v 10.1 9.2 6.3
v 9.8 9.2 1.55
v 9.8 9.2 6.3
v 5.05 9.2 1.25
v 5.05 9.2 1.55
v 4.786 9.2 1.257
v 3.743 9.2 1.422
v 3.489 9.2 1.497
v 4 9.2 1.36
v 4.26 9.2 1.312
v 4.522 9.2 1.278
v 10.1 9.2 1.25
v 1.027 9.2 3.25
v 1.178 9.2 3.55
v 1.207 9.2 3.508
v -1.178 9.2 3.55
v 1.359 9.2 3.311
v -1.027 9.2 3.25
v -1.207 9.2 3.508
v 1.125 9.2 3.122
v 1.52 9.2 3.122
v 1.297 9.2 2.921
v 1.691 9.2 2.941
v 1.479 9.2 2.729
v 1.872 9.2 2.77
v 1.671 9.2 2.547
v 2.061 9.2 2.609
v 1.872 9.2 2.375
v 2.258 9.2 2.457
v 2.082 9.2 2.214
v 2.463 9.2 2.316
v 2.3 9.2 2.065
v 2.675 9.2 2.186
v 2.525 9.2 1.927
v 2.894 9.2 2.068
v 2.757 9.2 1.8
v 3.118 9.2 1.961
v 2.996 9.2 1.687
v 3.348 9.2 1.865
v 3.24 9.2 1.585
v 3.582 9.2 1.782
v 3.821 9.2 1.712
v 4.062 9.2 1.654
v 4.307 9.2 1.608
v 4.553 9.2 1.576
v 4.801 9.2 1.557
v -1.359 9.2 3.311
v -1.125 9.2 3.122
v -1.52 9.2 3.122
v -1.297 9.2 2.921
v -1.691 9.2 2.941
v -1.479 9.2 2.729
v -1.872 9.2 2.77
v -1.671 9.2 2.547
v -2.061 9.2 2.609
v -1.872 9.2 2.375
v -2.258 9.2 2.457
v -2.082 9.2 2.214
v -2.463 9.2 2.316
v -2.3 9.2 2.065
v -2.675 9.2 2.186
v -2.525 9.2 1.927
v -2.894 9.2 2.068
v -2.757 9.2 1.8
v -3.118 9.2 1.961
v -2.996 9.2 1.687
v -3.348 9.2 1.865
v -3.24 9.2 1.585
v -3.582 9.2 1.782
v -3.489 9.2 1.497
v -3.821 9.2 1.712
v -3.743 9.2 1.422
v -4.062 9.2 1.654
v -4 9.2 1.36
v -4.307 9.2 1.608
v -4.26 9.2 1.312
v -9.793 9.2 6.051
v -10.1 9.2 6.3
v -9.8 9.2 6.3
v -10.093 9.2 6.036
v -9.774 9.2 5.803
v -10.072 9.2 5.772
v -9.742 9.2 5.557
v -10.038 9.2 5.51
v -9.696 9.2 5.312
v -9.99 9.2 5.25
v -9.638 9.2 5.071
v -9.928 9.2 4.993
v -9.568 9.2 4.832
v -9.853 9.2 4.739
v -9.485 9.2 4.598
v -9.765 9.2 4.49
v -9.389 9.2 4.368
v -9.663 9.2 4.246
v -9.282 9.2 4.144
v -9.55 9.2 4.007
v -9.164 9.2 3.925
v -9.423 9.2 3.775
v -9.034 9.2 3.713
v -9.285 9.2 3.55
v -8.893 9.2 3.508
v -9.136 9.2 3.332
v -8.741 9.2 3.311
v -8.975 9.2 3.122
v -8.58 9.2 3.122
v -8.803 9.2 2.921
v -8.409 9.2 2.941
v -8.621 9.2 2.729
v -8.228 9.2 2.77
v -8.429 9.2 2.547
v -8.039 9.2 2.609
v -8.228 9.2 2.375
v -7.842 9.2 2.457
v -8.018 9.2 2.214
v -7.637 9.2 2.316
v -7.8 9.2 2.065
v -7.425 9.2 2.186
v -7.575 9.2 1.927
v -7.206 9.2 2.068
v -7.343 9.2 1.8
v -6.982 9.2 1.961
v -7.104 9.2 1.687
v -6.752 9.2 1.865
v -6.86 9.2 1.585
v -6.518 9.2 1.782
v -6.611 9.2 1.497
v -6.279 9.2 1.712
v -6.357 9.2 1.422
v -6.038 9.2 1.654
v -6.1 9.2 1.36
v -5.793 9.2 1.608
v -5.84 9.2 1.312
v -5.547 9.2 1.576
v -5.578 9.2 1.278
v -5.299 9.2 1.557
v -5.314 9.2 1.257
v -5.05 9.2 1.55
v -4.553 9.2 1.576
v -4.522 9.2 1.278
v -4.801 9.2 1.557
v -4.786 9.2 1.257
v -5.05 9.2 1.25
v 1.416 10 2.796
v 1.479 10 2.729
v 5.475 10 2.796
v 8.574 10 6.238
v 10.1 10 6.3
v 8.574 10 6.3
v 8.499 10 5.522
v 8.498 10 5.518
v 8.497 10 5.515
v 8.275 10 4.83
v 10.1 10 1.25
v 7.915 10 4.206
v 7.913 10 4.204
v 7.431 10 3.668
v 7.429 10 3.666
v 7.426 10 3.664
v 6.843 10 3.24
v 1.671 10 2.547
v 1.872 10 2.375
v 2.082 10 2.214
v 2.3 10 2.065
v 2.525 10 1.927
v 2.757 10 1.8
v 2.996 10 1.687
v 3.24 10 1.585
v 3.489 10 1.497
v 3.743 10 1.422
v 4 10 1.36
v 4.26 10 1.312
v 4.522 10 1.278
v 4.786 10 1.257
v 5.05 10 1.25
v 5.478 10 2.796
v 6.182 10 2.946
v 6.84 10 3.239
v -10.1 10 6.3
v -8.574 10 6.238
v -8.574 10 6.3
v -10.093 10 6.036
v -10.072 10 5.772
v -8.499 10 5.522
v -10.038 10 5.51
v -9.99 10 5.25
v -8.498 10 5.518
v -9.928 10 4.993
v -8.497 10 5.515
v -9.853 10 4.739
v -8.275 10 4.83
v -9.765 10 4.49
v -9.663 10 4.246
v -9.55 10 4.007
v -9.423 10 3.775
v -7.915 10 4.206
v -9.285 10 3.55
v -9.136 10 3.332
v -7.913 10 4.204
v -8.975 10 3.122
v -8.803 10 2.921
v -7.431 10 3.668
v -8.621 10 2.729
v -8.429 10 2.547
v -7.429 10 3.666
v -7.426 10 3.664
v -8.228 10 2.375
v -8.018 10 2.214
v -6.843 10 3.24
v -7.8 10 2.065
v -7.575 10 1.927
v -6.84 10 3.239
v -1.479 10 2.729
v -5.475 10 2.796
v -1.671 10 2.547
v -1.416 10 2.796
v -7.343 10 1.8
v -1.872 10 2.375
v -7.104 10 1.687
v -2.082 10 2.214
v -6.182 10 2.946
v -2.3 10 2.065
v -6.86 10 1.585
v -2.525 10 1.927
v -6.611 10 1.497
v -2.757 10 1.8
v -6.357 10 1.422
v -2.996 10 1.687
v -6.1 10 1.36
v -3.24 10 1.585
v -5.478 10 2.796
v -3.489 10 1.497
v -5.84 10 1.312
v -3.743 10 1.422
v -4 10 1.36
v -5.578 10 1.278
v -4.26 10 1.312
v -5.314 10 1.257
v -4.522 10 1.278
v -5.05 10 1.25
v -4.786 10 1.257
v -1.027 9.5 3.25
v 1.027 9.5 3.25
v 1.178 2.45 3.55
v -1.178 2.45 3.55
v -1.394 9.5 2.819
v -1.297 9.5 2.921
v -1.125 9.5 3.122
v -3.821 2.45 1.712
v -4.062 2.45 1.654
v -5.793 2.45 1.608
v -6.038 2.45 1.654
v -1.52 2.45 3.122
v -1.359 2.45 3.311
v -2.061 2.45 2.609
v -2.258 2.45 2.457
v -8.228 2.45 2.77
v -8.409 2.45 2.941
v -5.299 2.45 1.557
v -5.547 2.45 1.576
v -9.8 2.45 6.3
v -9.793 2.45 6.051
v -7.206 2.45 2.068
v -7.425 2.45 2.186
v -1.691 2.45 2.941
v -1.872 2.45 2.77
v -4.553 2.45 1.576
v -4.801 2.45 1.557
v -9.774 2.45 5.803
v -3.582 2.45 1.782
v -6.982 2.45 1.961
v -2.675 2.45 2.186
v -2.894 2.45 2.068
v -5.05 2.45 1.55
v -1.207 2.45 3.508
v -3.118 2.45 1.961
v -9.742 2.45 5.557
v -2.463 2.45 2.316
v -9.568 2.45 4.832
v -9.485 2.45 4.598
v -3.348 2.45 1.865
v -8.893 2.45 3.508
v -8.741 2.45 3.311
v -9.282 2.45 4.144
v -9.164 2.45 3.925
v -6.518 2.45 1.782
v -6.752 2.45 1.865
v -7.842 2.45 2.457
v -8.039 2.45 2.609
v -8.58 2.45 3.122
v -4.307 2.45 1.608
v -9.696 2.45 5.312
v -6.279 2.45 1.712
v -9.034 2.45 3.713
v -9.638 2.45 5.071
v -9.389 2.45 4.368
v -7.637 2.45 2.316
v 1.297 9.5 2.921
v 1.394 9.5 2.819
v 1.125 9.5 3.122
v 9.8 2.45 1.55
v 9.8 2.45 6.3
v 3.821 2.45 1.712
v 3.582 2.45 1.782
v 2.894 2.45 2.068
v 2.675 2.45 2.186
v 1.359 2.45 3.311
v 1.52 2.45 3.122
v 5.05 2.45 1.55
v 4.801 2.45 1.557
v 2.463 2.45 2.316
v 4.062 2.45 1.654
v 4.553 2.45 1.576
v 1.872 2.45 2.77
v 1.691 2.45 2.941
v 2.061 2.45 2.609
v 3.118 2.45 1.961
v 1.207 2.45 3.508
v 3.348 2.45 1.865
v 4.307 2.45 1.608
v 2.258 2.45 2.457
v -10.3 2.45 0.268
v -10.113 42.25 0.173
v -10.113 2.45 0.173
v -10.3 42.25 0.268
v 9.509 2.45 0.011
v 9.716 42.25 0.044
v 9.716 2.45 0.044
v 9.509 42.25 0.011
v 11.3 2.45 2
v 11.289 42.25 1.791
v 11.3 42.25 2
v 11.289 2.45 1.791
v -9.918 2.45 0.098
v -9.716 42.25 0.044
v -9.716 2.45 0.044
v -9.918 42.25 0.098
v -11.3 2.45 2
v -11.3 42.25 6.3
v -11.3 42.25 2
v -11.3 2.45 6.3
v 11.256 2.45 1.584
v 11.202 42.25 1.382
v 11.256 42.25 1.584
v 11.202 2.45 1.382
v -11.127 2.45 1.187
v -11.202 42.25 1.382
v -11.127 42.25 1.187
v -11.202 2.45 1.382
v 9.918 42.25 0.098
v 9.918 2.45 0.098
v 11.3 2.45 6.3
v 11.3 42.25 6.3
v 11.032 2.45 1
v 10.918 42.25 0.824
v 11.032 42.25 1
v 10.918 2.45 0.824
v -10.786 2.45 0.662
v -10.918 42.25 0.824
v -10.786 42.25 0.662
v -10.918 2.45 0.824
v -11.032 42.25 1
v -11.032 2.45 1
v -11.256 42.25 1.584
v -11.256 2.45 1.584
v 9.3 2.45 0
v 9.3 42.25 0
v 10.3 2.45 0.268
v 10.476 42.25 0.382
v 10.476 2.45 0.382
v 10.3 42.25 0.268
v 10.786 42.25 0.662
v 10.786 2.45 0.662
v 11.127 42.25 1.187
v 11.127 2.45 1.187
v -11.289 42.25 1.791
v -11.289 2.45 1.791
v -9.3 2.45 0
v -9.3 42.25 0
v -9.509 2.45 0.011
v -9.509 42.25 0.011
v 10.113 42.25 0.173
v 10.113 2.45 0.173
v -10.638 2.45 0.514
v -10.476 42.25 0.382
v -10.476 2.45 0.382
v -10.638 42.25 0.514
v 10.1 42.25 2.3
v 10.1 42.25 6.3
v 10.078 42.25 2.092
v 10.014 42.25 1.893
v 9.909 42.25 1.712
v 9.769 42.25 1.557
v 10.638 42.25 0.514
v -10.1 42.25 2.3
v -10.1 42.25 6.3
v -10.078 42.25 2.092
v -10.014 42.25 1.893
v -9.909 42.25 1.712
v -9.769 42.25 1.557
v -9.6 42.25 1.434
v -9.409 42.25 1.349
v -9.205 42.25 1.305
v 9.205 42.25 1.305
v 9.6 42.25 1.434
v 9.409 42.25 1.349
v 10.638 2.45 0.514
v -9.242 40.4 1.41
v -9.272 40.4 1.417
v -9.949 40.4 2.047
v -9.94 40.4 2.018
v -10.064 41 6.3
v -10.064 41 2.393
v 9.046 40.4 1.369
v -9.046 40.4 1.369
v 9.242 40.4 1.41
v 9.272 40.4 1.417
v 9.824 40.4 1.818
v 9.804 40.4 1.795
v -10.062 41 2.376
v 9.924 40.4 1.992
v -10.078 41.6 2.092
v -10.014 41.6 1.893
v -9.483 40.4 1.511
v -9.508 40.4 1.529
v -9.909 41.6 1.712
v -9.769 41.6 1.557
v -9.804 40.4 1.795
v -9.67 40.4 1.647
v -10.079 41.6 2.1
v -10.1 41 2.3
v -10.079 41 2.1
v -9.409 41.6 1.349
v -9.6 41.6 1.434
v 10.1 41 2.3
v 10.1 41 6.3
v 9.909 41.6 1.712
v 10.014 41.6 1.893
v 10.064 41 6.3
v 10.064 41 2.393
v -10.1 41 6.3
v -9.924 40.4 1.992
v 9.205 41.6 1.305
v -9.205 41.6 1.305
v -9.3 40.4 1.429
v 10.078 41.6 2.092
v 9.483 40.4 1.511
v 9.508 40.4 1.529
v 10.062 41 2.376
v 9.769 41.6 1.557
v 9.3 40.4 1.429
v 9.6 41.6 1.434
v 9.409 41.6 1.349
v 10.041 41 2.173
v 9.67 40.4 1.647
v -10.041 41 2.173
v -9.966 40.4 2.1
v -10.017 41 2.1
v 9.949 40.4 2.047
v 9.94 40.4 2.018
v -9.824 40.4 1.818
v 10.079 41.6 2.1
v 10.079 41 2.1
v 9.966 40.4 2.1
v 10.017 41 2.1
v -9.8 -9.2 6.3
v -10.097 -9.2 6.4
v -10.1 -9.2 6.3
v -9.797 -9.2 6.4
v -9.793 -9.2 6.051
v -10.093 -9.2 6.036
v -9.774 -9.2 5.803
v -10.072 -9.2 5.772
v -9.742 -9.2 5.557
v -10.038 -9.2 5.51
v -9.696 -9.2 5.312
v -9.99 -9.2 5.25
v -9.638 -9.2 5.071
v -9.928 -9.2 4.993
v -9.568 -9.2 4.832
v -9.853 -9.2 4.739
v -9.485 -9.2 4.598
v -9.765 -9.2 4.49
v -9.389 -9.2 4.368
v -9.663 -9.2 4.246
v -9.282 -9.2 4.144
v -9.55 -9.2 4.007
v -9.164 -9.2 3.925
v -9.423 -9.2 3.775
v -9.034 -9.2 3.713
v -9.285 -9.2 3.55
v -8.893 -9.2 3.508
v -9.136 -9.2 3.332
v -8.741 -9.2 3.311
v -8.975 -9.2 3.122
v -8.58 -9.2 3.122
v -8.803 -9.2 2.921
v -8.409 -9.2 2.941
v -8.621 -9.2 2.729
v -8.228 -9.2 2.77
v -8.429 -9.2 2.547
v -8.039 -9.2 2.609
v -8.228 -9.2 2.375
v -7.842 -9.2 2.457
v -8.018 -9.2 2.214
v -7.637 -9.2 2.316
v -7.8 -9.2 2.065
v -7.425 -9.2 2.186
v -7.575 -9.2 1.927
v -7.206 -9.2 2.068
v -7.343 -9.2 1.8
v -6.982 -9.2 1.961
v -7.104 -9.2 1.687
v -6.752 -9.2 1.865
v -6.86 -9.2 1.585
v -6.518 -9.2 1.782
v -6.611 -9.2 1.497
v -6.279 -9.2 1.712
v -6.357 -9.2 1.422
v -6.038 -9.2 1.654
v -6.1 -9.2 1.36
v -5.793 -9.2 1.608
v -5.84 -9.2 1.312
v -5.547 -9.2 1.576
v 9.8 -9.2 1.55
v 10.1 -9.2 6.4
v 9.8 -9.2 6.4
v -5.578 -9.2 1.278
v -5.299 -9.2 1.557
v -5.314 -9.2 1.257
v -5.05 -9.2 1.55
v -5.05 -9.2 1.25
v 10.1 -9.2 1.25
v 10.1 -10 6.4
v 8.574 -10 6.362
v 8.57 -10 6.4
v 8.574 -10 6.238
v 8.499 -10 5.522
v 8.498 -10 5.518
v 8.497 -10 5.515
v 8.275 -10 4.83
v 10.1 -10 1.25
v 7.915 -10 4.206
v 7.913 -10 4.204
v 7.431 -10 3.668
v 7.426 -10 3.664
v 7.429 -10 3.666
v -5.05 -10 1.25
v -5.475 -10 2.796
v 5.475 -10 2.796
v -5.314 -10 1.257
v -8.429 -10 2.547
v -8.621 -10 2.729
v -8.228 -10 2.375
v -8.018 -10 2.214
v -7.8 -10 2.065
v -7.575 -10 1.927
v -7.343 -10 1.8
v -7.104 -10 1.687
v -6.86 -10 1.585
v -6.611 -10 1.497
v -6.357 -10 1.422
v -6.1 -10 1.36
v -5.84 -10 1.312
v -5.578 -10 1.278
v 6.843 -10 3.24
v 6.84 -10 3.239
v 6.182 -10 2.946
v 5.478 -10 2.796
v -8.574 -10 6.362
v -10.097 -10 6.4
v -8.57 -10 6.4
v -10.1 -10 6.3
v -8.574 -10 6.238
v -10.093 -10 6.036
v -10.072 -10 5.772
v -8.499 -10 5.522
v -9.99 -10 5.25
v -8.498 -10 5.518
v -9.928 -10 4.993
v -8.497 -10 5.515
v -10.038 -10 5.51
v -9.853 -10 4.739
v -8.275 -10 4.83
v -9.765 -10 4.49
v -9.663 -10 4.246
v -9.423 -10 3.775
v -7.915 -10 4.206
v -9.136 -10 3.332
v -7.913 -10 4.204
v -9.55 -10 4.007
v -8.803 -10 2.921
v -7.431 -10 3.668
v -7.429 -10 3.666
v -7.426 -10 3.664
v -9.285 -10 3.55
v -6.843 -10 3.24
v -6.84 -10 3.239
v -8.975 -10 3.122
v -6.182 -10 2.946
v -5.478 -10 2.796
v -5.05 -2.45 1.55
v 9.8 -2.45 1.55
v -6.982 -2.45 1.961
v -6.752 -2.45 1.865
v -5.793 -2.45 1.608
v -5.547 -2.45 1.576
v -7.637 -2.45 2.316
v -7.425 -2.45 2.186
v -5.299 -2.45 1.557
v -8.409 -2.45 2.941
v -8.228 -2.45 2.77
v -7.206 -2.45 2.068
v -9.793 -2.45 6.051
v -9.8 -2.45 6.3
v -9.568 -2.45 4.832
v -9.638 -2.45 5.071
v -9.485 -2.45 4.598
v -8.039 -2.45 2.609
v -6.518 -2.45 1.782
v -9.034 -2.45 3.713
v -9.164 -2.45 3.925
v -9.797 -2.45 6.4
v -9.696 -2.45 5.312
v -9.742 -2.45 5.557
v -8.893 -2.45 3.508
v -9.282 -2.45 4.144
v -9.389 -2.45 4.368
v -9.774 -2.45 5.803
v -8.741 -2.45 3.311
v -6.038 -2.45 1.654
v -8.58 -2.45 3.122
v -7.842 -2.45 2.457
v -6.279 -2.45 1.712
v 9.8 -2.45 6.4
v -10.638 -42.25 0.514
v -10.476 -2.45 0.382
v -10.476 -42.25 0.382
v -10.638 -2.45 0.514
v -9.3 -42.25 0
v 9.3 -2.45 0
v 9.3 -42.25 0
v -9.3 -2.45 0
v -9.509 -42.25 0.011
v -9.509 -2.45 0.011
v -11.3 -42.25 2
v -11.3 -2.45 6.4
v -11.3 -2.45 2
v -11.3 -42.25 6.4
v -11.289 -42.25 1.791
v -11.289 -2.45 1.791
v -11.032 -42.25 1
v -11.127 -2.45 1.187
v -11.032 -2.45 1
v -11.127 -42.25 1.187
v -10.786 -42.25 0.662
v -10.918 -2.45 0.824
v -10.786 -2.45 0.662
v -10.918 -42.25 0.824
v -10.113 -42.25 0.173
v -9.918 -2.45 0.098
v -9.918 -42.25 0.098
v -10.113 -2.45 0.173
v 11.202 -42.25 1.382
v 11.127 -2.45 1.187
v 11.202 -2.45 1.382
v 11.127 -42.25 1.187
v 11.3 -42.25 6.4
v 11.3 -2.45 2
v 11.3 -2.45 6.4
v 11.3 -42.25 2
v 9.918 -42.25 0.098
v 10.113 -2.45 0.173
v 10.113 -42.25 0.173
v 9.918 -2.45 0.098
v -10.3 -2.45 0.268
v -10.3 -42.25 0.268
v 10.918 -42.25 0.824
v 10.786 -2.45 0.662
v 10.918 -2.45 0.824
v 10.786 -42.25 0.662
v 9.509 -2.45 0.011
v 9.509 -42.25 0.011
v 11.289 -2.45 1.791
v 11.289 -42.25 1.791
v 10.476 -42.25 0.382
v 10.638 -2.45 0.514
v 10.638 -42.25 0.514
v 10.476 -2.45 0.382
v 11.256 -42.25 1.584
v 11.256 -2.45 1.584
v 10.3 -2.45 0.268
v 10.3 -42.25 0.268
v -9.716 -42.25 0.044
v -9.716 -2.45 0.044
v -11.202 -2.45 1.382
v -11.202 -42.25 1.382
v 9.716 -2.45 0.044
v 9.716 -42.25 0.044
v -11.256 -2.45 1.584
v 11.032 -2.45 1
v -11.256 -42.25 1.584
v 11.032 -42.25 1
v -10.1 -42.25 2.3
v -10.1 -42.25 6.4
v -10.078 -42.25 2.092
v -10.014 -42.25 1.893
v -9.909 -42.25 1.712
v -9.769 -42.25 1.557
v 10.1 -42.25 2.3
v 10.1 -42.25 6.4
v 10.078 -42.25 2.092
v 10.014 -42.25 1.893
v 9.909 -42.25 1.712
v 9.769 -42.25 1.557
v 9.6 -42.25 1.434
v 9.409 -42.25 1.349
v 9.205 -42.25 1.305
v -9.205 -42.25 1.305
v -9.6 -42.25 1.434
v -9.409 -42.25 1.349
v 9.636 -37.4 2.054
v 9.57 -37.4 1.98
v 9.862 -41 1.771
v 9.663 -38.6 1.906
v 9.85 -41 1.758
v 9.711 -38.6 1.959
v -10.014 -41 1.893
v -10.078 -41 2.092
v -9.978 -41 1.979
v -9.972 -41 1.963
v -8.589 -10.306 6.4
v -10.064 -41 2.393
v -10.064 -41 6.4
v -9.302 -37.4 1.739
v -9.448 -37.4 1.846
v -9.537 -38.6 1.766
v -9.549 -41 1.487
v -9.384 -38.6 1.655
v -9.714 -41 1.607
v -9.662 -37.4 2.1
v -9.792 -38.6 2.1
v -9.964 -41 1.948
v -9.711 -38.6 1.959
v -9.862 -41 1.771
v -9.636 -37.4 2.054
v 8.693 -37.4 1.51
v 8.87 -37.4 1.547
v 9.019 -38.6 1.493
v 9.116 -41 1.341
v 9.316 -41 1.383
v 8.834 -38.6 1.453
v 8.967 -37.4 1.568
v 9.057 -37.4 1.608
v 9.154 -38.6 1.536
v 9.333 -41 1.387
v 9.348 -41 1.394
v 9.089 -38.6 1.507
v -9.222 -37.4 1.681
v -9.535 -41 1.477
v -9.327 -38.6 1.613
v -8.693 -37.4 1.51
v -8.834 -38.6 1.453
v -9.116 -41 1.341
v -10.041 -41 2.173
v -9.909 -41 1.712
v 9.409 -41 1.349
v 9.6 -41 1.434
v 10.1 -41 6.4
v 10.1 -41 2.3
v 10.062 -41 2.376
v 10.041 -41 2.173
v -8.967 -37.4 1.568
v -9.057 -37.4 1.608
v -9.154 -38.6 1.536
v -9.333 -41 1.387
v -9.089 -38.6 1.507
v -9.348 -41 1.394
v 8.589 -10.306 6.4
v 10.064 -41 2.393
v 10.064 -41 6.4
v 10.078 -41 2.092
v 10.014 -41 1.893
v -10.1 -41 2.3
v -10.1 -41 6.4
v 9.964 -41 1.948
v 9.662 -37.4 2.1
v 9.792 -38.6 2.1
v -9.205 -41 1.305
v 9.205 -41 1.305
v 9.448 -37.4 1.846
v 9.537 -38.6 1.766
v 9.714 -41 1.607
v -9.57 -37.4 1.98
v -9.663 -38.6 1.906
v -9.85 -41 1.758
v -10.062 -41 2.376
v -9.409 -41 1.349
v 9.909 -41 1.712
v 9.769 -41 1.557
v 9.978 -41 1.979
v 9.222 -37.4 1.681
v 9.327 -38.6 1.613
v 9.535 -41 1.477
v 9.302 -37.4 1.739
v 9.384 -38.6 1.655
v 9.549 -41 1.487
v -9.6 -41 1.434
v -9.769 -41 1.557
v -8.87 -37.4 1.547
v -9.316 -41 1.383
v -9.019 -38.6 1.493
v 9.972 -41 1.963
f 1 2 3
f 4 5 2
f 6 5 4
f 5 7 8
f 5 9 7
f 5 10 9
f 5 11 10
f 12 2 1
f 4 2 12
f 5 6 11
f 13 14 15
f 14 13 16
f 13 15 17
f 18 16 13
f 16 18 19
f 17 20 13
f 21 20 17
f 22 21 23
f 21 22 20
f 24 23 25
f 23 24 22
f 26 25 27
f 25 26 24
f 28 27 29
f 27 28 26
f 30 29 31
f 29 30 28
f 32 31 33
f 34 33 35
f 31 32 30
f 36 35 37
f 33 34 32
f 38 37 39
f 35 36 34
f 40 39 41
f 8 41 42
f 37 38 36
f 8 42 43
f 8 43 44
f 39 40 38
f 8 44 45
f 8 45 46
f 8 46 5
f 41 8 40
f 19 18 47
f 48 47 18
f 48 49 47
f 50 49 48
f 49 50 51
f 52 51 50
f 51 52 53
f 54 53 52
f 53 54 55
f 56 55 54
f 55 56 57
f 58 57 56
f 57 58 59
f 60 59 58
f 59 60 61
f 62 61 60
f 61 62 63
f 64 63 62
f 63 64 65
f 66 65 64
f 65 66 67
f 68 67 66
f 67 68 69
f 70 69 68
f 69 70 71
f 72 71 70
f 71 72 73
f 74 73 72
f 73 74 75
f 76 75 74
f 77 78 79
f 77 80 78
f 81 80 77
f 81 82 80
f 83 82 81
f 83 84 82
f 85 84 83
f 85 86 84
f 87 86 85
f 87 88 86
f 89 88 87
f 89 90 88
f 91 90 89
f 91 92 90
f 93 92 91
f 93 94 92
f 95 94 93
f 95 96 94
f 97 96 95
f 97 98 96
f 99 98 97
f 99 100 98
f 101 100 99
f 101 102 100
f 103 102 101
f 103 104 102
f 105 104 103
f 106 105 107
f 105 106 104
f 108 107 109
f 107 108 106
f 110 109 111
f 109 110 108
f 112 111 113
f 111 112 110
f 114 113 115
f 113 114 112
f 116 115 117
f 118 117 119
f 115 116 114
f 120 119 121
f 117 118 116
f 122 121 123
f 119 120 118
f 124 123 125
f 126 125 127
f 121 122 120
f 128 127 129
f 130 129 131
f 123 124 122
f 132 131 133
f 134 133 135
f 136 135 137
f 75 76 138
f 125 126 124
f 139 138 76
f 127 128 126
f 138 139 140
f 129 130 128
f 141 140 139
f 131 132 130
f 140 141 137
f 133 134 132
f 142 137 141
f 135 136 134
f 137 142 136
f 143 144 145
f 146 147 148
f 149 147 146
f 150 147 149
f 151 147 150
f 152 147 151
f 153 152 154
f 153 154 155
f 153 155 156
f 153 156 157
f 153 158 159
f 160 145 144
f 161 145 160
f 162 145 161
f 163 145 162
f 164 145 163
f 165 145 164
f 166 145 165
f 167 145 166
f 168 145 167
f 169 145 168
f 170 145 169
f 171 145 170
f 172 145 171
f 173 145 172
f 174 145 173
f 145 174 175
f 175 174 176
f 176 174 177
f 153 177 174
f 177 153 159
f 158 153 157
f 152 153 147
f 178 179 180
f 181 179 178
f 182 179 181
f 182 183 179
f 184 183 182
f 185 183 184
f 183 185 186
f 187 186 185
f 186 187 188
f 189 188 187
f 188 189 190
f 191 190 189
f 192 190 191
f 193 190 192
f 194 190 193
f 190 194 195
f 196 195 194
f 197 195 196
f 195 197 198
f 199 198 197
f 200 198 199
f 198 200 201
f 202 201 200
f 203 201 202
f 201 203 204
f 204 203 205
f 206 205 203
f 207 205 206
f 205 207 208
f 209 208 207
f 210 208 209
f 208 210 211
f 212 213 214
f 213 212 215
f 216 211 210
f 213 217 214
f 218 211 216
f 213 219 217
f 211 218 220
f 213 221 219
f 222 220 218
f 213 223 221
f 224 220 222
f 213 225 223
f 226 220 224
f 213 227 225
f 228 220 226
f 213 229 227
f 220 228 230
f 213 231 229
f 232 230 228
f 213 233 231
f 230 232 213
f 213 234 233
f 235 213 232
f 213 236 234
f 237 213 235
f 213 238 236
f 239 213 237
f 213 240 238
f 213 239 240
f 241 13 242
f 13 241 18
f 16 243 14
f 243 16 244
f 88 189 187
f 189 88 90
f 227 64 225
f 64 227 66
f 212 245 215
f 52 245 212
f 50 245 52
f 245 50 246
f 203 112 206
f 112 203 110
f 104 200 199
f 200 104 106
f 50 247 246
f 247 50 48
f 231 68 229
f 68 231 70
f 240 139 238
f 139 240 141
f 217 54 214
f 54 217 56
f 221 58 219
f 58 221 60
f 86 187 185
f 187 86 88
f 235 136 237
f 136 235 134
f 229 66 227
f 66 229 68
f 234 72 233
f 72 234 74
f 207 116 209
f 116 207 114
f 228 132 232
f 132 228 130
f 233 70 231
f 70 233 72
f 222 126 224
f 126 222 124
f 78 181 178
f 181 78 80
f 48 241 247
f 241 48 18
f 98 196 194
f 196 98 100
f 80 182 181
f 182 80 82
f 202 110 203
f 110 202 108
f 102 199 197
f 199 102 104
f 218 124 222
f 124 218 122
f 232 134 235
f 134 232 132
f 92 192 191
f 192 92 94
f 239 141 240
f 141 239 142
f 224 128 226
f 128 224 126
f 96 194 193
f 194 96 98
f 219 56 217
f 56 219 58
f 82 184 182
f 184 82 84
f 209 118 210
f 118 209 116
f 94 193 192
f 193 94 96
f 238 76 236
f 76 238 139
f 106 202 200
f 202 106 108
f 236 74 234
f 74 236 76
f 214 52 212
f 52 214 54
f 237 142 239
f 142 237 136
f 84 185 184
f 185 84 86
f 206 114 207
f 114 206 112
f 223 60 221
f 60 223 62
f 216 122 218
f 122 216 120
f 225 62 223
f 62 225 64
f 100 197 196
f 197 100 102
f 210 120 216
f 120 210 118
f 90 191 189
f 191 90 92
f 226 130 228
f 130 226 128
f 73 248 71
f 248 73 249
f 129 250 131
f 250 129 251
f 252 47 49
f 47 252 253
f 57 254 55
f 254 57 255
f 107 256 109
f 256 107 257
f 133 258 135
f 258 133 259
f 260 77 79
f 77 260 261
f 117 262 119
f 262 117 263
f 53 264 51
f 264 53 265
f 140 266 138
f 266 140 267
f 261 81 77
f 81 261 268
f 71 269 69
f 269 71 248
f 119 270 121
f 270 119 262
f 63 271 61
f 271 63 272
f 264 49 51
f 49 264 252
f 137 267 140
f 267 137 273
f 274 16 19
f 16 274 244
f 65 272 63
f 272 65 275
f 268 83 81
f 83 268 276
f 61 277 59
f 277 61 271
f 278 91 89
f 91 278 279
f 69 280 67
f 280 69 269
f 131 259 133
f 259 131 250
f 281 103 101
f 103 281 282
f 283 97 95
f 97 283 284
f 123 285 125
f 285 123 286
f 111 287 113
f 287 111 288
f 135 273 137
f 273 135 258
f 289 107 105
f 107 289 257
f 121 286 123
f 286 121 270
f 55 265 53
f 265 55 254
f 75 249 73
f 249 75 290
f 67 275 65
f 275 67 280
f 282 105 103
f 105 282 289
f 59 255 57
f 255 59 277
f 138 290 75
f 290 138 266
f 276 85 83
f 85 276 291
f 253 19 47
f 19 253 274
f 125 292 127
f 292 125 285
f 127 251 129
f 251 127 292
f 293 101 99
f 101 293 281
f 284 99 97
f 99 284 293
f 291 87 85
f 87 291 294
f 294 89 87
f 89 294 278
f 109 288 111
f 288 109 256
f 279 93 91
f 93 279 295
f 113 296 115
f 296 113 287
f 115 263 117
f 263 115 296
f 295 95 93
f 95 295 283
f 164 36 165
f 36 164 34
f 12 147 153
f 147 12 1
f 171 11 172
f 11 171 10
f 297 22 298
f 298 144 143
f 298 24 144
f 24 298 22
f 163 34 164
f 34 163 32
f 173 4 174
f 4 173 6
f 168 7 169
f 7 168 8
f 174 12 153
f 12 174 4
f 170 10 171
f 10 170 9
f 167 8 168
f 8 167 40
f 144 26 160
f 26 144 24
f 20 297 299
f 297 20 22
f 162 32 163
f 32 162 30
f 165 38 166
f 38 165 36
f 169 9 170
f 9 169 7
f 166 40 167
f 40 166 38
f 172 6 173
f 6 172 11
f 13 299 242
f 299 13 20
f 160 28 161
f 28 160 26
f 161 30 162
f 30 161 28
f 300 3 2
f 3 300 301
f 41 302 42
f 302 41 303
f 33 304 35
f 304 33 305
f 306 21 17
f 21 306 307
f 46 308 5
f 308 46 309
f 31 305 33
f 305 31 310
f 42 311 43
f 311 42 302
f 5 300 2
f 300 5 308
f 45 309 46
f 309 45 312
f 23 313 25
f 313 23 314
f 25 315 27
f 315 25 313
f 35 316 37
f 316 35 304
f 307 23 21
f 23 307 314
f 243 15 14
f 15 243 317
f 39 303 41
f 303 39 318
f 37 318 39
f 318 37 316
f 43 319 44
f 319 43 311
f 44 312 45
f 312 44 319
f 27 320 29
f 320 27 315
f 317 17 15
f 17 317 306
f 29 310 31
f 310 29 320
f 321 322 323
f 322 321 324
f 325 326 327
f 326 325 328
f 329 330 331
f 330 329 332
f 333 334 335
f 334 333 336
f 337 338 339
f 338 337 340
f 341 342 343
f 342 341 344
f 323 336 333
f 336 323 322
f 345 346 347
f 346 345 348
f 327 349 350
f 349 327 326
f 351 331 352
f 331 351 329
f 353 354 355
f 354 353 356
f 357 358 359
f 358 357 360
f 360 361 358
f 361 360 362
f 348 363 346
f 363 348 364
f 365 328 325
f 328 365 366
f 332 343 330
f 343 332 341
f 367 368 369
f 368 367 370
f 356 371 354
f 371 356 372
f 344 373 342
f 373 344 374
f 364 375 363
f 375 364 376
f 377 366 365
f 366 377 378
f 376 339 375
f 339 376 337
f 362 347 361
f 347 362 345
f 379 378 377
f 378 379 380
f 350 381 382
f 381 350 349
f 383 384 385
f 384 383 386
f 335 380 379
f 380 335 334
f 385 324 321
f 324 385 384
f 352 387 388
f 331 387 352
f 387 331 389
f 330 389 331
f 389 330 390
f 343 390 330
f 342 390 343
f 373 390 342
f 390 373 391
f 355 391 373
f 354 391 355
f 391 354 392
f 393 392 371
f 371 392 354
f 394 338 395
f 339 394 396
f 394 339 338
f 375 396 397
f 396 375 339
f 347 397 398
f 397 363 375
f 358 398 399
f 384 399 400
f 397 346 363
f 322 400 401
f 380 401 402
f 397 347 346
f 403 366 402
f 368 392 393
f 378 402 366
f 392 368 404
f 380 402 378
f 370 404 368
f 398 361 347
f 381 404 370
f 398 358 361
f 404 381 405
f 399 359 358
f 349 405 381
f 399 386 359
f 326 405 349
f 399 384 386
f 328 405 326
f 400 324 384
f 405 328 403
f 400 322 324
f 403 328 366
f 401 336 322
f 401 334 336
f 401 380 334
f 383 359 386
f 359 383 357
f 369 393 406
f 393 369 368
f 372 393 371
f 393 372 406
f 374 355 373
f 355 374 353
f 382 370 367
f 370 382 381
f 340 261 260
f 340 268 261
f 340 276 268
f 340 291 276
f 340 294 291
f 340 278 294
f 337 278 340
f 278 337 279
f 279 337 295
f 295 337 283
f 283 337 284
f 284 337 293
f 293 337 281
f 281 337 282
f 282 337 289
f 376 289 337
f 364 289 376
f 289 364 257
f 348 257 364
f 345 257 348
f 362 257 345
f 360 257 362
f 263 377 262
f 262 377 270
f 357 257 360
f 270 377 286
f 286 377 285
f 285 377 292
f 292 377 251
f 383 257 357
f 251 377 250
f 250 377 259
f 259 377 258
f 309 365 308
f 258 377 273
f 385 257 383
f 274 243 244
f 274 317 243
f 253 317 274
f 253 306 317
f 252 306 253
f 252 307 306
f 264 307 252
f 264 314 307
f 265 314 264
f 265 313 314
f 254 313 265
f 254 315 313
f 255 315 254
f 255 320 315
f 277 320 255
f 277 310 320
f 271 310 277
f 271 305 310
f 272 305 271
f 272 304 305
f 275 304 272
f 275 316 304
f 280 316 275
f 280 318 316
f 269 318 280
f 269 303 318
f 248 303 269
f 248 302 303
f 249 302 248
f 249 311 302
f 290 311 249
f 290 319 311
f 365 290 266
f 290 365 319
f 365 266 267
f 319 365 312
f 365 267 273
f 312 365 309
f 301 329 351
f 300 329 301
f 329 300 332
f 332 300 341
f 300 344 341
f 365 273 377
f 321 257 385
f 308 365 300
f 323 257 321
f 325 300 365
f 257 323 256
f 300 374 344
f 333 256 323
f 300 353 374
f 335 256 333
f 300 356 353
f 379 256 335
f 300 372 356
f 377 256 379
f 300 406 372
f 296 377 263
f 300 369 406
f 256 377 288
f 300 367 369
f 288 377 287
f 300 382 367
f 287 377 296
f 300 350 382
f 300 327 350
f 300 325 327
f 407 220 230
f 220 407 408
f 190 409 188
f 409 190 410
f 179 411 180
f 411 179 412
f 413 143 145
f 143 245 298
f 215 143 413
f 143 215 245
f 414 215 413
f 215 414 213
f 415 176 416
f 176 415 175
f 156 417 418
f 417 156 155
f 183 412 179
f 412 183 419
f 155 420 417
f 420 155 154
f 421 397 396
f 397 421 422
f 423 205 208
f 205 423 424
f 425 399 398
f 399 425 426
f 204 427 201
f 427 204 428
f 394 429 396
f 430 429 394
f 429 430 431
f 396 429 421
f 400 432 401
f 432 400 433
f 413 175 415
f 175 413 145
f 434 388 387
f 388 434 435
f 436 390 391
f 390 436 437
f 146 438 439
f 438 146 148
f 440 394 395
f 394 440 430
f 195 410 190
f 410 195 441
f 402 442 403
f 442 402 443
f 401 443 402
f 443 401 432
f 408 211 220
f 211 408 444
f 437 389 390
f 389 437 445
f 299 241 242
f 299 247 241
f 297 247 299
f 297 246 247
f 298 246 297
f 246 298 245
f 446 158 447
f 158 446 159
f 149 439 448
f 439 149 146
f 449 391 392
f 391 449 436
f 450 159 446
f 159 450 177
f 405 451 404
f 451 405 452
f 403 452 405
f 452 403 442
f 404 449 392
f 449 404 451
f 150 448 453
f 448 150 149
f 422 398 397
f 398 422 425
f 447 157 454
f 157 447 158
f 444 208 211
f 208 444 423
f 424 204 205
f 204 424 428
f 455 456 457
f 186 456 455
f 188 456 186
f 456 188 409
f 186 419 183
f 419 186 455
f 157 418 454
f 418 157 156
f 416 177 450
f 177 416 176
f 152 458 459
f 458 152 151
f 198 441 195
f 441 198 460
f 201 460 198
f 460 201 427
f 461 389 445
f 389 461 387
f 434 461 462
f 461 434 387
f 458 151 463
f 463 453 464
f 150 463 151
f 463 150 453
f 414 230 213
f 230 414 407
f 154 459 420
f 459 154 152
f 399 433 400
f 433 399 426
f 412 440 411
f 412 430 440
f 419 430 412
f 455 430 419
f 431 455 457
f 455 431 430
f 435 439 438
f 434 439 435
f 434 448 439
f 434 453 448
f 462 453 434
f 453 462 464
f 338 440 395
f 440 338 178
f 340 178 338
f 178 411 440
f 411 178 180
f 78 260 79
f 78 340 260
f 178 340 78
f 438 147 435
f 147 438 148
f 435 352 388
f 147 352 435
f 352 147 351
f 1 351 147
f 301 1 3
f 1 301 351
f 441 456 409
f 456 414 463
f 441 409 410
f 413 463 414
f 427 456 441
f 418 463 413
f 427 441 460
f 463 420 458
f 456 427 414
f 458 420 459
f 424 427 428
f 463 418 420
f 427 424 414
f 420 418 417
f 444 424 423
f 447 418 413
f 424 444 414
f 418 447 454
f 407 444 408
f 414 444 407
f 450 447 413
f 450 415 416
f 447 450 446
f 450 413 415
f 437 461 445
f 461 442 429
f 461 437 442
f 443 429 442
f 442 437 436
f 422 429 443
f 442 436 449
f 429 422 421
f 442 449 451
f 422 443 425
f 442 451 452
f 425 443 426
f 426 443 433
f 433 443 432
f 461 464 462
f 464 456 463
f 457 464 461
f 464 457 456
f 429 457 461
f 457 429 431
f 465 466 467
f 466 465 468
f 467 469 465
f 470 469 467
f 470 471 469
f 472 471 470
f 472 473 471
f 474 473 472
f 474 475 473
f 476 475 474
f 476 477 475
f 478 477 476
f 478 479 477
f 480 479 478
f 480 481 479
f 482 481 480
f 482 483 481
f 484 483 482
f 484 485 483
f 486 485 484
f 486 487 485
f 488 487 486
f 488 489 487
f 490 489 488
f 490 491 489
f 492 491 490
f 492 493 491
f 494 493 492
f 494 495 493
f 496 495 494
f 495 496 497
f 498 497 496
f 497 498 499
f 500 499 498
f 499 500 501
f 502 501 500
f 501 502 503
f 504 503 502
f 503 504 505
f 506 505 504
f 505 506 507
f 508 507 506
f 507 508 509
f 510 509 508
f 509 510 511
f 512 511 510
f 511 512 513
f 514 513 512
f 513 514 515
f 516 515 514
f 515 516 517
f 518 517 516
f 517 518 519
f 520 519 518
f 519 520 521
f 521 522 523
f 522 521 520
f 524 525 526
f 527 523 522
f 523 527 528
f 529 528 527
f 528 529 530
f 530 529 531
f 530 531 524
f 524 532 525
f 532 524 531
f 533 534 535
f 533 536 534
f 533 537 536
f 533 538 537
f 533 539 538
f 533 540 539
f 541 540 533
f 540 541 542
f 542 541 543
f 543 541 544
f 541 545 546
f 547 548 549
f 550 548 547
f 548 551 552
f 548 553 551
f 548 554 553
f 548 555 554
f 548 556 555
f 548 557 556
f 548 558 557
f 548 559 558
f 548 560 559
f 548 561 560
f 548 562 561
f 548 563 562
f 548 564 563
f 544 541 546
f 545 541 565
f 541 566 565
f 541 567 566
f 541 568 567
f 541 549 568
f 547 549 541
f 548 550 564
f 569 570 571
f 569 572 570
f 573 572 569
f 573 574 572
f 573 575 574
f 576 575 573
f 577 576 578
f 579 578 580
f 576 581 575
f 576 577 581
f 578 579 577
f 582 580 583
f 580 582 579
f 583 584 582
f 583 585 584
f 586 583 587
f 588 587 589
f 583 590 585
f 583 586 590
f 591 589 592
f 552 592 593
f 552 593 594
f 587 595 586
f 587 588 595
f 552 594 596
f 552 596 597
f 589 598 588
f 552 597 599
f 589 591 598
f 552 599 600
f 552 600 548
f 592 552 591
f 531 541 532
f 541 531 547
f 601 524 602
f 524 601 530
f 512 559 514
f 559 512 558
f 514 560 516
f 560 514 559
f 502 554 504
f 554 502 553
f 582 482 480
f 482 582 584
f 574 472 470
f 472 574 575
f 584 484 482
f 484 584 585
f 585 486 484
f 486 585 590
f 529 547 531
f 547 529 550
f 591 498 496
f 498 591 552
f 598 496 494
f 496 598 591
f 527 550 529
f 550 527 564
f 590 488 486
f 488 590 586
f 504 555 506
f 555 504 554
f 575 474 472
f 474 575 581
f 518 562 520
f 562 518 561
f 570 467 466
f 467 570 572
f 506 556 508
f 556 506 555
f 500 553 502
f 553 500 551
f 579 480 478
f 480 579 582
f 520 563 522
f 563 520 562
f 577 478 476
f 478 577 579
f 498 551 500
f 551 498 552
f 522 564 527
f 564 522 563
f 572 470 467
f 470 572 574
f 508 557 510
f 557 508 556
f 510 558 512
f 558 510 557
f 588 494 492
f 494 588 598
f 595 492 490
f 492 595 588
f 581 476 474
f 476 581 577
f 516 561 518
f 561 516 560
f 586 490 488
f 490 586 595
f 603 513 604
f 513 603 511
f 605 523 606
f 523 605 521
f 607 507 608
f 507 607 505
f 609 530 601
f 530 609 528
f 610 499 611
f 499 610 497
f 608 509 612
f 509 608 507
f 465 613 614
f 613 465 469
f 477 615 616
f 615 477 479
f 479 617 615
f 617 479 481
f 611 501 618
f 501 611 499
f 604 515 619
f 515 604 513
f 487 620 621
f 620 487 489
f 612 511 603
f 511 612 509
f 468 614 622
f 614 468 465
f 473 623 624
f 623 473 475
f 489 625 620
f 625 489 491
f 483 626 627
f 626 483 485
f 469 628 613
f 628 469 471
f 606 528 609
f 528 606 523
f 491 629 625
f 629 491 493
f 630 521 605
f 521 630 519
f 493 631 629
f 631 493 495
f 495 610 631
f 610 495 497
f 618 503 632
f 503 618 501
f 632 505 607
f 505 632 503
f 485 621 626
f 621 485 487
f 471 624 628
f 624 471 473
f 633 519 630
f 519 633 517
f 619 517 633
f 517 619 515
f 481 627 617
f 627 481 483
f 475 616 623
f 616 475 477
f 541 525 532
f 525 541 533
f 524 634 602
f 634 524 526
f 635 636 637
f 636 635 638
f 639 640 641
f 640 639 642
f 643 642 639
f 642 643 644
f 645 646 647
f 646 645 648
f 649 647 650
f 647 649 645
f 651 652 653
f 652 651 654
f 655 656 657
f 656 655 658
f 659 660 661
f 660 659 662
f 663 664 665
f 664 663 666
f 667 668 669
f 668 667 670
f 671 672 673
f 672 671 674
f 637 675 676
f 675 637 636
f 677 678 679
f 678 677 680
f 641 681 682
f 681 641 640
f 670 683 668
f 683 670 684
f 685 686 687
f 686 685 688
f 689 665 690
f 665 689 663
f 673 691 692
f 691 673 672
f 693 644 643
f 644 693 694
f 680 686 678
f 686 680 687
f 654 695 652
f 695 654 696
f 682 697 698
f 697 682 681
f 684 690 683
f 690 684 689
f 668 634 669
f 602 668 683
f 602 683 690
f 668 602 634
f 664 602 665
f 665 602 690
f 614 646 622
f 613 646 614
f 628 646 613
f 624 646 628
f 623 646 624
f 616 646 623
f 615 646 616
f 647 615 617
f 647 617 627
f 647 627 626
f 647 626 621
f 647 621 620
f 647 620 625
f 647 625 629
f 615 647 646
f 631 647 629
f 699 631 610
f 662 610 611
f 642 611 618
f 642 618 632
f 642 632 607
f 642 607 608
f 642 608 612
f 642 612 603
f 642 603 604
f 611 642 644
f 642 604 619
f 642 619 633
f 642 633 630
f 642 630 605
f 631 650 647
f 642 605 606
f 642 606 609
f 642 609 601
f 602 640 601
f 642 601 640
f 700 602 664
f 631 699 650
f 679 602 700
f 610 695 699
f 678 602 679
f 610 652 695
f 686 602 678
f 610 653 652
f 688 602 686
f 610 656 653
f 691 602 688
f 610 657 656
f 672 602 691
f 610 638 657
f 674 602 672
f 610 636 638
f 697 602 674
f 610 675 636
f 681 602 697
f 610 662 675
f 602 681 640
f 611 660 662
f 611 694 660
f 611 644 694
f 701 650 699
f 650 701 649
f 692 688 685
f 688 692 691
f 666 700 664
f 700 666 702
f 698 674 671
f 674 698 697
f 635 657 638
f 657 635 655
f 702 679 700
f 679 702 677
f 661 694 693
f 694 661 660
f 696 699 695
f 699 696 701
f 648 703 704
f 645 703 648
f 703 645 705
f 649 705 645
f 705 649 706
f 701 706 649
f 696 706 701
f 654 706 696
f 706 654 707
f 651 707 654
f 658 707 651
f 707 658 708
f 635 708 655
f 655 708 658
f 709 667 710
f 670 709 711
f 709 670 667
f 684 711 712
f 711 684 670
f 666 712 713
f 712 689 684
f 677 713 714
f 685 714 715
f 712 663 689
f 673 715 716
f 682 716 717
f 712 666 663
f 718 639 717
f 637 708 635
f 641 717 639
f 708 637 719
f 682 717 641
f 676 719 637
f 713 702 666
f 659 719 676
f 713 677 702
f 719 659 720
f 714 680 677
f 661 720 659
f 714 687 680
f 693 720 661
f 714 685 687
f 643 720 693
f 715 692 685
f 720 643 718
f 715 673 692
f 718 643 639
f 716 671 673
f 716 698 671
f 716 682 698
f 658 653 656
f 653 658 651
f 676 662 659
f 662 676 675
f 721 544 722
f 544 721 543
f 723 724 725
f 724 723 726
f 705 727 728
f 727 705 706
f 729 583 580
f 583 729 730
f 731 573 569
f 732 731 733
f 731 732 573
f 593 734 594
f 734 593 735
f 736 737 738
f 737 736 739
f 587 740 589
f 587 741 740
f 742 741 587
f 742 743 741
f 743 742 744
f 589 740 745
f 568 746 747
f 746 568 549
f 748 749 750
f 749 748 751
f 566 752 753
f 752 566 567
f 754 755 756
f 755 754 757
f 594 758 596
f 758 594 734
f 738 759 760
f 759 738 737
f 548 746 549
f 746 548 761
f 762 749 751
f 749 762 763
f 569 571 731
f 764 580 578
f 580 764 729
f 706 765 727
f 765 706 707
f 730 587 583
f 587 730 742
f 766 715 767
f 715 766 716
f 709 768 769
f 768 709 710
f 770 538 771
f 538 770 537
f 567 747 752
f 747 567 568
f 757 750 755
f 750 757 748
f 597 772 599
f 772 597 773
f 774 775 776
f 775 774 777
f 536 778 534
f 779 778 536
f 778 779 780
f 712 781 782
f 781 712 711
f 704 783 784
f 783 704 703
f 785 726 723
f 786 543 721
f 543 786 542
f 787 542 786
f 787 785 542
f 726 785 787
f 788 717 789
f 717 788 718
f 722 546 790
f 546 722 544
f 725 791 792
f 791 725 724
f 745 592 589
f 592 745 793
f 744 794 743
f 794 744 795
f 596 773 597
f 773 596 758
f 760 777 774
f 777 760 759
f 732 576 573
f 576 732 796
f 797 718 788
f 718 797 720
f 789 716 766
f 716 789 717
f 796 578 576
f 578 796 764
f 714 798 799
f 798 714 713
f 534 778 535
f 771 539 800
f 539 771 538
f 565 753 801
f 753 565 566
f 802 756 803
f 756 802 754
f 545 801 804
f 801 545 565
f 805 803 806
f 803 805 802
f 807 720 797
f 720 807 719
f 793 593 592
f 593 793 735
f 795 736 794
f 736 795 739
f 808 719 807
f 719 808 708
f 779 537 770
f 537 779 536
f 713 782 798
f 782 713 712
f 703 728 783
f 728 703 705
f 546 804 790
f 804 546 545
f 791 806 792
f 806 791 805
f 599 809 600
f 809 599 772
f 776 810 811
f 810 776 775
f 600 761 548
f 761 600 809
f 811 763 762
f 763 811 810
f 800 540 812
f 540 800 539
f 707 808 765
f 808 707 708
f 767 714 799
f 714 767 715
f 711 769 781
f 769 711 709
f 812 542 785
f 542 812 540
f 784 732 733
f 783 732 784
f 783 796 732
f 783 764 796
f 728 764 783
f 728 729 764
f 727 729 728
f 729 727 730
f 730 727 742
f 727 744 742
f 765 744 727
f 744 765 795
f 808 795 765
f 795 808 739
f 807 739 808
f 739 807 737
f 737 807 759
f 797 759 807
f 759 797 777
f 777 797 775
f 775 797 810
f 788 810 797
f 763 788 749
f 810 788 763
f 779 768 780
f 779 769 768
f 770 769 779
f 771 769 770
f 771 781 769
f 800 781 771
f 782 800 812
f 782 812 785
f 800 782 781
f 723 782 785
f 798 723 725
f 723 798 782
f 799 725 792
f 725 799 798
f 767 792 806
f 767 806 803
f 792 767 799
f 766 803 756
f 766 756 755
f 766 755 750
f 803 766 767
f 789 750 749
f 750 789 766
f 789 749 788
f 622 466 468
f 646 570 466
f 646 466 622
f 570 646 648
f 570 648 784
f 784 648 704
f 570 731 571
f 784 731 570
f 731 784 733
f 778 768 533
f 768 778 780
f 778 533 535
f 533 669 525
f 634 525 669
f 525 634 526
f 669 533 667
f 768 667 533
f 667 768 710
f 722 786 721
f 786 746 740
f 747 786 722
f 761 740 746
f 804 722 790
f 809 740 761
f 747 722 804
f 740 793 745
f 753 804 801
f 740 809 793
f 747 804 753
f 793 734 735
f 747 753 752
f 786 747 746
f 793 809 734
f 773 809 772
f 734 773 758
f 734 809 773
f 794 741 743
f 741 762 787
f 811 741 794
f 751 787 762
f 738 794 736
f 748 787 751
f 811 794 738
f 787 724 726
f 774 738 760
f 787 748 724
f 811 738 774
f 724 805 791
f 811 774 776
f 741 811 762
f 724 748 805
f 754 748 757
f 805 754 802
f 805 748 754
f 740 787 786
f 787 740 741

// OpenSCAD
// file: ec5.scad
$fn = 120;

ec5_male();
translate([0, 12, 0]) ec5_female();


module ec5_male(t=0.2, fill=false) {
    difference() {
        union() {
            translate([-(19.3-9.2)/2, -(9.2+t)/2, 0]) {
                translate([0, -0.6/2, 0]) cube([10+t, 7.8+t, 0.8]);
                cube([10+t, 7.2+t, 7.8]);
            }
            translate([-(19.3-9.2)/2, 0, 0]) {
                cylinder(d=9.8+t, h=0.8);
                cylinder(d=9.2+t, h=25);
            }
            translate([(19.3-9.2)/2, 0, 0]) {
                ec5_plus(d=9.8+t, h=0.8);
                ec5_plus(d=9.2+t, h=25);
            }
        }
        if(fill == false) {
            translate([-(19.3-9.2)/2, 0, 8]) cylinder(d=8-t, h=25.1);
            translate([(19.3-9.2)/2, 0, 8]) ec5_plus(d=8-t, h=25.1);
        }
    }
    translate([-(19.3-9.2)/2, 0, 0]) cylinder(d=5+t, h=21.2+t);
    translate([(19.3-9.2)/2, 0, 0]) cylinder(d=5+t, h=21.2+t);
}



module ec5_female(t=0.2, fill=false) {
    difference() {
        union() {
            translate([-(19.3-9.2)/2, -(9.2+t)/2+2, 0]) {
                translate([0, -0.6/2, 0]) cube([10+t, 7.8+t, 0.8]);
                cube([10+t, 7.2+t, 7.8]);
            }
            translate([-(19.3-9.2)/2, 0, 0]) {
                cylinder(d=9.8+t, h=0.8);
                cylinder(d=9.2+t, h=7.8);
                cylinder(d=7.7+t, h=23.7);
            }
            translate([(19.3-9.2)/2, 0, 0]) {
                ec5_plus(d=9.8+t, h=0.8);
                ec5_plus(d=9.2+t, h=7.8);
                ec5_plus(d=7.7+t, h=23.7);
            }
        }
        if(fill == false) {
            translate([-(19.3-9.2)/2, 0, 8]) cylinder(d=6.3+t, h=25.1);
            translate([(19.3-9.2)/2, 0, 8]) cylinder(d=6.3+t, h=25.1);
        }
    }
    translate([-(19.3-9.2)/2, 0, 0]) difference() {
        cylinder(d=6.5, h=20.4+t);
        cylinder(d=5+t, h=20.6+t);
    }
    translate([(19.3-9.2)/2, 0, 0]) difference() {
        cylinder(d=6.5, h=20.4+t);
        cylinder(d=5+t, h=20.6+t);
    }
}


module ec5_plus(d, h) {
    hull() {
        cylinder(d=d, h=h);
        translate([0, -d/2, 0]) cube([d/2, d, h]);
    }
}
// main file
use<ec5.scad>

// 2.5mm² * 2 : [8.5, 8.0]
// 2.5mm² / AWG 14: [8.5, 4.0]
// 1.5mm² / AWG 16: [5.0, 3.2]

printable_grip(wiresize = [20.2, 10], lenght = 32);


module printable_grip(wiresize = [], lenght) {
    translate([0, 10, 6.3]) rotate([90, 0, 0]) half_grip(wiresize = wiresize, lenght = lenght);
    translate([0, -10, 6.3]) rotate([-90, 0, 0]) half_grip(half=1, wiresize = wiresize, lenght = lenght);
}


module half_grip(half = 0, wiresize = [8, 4], lenght = 16) {
    difference() {
        hull() {
            translate([0, 0, 3.8]) roundedCube([22.6, 12.6, 7.5], 2, center=true, $fn=60);
            translate([0, 0, -lenght]) roundedCube([wiresize[0]+2.4, 12.6, 0.5], 2, center=true, $fn=60);
        }
        ec5_female(t=0.3);
        hull() {
            translate([-5.05, 0, 0]) cylinder(d=7, h=0.5, $fn=30);
            translate([5.05, 0, 0]) cylinder(d=7, h=0.5, $fn=30);
            translate([0, 0, -lenght]) roundedCube([wiresize[0], wiresize[1], 0.5], 1, center=true, $fn=30);
        }
        translate([0, 0, -lenght]) roundedCube([wiresize[0], wiresize[1], 2], 1, center=true, $fn=30);
        if(half == 0)
            translate([-20, 0, -lenght*1.5]) cube([40, 20, lenght*2]);
        else
            translate([-20, -20.1, -lenght*1.5]) cube([40, 20, lenght*2]);
    }
    if(half == 0)
        translate([0, -wiresize[1]*0.5, -lenght+1]) cube([wiresize[0], 1.6, 1.2], center=true);
    else
        translate([0, wiresize[1]*0.5, -lenght+4]) cube([wiresize[0], 1.6, 01.2], center=true);
}


module roundedCube(size, radius, center) {
    if(center) translate([0, 0, 0]);
    else translate([size[0]/2, size[1]/2, 0]);
    hull() {
        translate([-size[0]/2 + radius, -size[1]/2 + radius, 0]) cylinder(r=radius, h=size[2], center=center);
        translate([size[0]/2 - radius, -size[1]/2 + radius, 0]) cylinder(r=radius, h=size[2], center=center);
        translate([-size[0]/2 + radius, size[1]/2 - radius, 0]) cylinder(r=radius, h=size[2], center=center);
        translate([size[0]/2 - radius, size[1]/2 - radius, 0]) cylinder(r=radius, h=size[2], center=center);
    }
}
